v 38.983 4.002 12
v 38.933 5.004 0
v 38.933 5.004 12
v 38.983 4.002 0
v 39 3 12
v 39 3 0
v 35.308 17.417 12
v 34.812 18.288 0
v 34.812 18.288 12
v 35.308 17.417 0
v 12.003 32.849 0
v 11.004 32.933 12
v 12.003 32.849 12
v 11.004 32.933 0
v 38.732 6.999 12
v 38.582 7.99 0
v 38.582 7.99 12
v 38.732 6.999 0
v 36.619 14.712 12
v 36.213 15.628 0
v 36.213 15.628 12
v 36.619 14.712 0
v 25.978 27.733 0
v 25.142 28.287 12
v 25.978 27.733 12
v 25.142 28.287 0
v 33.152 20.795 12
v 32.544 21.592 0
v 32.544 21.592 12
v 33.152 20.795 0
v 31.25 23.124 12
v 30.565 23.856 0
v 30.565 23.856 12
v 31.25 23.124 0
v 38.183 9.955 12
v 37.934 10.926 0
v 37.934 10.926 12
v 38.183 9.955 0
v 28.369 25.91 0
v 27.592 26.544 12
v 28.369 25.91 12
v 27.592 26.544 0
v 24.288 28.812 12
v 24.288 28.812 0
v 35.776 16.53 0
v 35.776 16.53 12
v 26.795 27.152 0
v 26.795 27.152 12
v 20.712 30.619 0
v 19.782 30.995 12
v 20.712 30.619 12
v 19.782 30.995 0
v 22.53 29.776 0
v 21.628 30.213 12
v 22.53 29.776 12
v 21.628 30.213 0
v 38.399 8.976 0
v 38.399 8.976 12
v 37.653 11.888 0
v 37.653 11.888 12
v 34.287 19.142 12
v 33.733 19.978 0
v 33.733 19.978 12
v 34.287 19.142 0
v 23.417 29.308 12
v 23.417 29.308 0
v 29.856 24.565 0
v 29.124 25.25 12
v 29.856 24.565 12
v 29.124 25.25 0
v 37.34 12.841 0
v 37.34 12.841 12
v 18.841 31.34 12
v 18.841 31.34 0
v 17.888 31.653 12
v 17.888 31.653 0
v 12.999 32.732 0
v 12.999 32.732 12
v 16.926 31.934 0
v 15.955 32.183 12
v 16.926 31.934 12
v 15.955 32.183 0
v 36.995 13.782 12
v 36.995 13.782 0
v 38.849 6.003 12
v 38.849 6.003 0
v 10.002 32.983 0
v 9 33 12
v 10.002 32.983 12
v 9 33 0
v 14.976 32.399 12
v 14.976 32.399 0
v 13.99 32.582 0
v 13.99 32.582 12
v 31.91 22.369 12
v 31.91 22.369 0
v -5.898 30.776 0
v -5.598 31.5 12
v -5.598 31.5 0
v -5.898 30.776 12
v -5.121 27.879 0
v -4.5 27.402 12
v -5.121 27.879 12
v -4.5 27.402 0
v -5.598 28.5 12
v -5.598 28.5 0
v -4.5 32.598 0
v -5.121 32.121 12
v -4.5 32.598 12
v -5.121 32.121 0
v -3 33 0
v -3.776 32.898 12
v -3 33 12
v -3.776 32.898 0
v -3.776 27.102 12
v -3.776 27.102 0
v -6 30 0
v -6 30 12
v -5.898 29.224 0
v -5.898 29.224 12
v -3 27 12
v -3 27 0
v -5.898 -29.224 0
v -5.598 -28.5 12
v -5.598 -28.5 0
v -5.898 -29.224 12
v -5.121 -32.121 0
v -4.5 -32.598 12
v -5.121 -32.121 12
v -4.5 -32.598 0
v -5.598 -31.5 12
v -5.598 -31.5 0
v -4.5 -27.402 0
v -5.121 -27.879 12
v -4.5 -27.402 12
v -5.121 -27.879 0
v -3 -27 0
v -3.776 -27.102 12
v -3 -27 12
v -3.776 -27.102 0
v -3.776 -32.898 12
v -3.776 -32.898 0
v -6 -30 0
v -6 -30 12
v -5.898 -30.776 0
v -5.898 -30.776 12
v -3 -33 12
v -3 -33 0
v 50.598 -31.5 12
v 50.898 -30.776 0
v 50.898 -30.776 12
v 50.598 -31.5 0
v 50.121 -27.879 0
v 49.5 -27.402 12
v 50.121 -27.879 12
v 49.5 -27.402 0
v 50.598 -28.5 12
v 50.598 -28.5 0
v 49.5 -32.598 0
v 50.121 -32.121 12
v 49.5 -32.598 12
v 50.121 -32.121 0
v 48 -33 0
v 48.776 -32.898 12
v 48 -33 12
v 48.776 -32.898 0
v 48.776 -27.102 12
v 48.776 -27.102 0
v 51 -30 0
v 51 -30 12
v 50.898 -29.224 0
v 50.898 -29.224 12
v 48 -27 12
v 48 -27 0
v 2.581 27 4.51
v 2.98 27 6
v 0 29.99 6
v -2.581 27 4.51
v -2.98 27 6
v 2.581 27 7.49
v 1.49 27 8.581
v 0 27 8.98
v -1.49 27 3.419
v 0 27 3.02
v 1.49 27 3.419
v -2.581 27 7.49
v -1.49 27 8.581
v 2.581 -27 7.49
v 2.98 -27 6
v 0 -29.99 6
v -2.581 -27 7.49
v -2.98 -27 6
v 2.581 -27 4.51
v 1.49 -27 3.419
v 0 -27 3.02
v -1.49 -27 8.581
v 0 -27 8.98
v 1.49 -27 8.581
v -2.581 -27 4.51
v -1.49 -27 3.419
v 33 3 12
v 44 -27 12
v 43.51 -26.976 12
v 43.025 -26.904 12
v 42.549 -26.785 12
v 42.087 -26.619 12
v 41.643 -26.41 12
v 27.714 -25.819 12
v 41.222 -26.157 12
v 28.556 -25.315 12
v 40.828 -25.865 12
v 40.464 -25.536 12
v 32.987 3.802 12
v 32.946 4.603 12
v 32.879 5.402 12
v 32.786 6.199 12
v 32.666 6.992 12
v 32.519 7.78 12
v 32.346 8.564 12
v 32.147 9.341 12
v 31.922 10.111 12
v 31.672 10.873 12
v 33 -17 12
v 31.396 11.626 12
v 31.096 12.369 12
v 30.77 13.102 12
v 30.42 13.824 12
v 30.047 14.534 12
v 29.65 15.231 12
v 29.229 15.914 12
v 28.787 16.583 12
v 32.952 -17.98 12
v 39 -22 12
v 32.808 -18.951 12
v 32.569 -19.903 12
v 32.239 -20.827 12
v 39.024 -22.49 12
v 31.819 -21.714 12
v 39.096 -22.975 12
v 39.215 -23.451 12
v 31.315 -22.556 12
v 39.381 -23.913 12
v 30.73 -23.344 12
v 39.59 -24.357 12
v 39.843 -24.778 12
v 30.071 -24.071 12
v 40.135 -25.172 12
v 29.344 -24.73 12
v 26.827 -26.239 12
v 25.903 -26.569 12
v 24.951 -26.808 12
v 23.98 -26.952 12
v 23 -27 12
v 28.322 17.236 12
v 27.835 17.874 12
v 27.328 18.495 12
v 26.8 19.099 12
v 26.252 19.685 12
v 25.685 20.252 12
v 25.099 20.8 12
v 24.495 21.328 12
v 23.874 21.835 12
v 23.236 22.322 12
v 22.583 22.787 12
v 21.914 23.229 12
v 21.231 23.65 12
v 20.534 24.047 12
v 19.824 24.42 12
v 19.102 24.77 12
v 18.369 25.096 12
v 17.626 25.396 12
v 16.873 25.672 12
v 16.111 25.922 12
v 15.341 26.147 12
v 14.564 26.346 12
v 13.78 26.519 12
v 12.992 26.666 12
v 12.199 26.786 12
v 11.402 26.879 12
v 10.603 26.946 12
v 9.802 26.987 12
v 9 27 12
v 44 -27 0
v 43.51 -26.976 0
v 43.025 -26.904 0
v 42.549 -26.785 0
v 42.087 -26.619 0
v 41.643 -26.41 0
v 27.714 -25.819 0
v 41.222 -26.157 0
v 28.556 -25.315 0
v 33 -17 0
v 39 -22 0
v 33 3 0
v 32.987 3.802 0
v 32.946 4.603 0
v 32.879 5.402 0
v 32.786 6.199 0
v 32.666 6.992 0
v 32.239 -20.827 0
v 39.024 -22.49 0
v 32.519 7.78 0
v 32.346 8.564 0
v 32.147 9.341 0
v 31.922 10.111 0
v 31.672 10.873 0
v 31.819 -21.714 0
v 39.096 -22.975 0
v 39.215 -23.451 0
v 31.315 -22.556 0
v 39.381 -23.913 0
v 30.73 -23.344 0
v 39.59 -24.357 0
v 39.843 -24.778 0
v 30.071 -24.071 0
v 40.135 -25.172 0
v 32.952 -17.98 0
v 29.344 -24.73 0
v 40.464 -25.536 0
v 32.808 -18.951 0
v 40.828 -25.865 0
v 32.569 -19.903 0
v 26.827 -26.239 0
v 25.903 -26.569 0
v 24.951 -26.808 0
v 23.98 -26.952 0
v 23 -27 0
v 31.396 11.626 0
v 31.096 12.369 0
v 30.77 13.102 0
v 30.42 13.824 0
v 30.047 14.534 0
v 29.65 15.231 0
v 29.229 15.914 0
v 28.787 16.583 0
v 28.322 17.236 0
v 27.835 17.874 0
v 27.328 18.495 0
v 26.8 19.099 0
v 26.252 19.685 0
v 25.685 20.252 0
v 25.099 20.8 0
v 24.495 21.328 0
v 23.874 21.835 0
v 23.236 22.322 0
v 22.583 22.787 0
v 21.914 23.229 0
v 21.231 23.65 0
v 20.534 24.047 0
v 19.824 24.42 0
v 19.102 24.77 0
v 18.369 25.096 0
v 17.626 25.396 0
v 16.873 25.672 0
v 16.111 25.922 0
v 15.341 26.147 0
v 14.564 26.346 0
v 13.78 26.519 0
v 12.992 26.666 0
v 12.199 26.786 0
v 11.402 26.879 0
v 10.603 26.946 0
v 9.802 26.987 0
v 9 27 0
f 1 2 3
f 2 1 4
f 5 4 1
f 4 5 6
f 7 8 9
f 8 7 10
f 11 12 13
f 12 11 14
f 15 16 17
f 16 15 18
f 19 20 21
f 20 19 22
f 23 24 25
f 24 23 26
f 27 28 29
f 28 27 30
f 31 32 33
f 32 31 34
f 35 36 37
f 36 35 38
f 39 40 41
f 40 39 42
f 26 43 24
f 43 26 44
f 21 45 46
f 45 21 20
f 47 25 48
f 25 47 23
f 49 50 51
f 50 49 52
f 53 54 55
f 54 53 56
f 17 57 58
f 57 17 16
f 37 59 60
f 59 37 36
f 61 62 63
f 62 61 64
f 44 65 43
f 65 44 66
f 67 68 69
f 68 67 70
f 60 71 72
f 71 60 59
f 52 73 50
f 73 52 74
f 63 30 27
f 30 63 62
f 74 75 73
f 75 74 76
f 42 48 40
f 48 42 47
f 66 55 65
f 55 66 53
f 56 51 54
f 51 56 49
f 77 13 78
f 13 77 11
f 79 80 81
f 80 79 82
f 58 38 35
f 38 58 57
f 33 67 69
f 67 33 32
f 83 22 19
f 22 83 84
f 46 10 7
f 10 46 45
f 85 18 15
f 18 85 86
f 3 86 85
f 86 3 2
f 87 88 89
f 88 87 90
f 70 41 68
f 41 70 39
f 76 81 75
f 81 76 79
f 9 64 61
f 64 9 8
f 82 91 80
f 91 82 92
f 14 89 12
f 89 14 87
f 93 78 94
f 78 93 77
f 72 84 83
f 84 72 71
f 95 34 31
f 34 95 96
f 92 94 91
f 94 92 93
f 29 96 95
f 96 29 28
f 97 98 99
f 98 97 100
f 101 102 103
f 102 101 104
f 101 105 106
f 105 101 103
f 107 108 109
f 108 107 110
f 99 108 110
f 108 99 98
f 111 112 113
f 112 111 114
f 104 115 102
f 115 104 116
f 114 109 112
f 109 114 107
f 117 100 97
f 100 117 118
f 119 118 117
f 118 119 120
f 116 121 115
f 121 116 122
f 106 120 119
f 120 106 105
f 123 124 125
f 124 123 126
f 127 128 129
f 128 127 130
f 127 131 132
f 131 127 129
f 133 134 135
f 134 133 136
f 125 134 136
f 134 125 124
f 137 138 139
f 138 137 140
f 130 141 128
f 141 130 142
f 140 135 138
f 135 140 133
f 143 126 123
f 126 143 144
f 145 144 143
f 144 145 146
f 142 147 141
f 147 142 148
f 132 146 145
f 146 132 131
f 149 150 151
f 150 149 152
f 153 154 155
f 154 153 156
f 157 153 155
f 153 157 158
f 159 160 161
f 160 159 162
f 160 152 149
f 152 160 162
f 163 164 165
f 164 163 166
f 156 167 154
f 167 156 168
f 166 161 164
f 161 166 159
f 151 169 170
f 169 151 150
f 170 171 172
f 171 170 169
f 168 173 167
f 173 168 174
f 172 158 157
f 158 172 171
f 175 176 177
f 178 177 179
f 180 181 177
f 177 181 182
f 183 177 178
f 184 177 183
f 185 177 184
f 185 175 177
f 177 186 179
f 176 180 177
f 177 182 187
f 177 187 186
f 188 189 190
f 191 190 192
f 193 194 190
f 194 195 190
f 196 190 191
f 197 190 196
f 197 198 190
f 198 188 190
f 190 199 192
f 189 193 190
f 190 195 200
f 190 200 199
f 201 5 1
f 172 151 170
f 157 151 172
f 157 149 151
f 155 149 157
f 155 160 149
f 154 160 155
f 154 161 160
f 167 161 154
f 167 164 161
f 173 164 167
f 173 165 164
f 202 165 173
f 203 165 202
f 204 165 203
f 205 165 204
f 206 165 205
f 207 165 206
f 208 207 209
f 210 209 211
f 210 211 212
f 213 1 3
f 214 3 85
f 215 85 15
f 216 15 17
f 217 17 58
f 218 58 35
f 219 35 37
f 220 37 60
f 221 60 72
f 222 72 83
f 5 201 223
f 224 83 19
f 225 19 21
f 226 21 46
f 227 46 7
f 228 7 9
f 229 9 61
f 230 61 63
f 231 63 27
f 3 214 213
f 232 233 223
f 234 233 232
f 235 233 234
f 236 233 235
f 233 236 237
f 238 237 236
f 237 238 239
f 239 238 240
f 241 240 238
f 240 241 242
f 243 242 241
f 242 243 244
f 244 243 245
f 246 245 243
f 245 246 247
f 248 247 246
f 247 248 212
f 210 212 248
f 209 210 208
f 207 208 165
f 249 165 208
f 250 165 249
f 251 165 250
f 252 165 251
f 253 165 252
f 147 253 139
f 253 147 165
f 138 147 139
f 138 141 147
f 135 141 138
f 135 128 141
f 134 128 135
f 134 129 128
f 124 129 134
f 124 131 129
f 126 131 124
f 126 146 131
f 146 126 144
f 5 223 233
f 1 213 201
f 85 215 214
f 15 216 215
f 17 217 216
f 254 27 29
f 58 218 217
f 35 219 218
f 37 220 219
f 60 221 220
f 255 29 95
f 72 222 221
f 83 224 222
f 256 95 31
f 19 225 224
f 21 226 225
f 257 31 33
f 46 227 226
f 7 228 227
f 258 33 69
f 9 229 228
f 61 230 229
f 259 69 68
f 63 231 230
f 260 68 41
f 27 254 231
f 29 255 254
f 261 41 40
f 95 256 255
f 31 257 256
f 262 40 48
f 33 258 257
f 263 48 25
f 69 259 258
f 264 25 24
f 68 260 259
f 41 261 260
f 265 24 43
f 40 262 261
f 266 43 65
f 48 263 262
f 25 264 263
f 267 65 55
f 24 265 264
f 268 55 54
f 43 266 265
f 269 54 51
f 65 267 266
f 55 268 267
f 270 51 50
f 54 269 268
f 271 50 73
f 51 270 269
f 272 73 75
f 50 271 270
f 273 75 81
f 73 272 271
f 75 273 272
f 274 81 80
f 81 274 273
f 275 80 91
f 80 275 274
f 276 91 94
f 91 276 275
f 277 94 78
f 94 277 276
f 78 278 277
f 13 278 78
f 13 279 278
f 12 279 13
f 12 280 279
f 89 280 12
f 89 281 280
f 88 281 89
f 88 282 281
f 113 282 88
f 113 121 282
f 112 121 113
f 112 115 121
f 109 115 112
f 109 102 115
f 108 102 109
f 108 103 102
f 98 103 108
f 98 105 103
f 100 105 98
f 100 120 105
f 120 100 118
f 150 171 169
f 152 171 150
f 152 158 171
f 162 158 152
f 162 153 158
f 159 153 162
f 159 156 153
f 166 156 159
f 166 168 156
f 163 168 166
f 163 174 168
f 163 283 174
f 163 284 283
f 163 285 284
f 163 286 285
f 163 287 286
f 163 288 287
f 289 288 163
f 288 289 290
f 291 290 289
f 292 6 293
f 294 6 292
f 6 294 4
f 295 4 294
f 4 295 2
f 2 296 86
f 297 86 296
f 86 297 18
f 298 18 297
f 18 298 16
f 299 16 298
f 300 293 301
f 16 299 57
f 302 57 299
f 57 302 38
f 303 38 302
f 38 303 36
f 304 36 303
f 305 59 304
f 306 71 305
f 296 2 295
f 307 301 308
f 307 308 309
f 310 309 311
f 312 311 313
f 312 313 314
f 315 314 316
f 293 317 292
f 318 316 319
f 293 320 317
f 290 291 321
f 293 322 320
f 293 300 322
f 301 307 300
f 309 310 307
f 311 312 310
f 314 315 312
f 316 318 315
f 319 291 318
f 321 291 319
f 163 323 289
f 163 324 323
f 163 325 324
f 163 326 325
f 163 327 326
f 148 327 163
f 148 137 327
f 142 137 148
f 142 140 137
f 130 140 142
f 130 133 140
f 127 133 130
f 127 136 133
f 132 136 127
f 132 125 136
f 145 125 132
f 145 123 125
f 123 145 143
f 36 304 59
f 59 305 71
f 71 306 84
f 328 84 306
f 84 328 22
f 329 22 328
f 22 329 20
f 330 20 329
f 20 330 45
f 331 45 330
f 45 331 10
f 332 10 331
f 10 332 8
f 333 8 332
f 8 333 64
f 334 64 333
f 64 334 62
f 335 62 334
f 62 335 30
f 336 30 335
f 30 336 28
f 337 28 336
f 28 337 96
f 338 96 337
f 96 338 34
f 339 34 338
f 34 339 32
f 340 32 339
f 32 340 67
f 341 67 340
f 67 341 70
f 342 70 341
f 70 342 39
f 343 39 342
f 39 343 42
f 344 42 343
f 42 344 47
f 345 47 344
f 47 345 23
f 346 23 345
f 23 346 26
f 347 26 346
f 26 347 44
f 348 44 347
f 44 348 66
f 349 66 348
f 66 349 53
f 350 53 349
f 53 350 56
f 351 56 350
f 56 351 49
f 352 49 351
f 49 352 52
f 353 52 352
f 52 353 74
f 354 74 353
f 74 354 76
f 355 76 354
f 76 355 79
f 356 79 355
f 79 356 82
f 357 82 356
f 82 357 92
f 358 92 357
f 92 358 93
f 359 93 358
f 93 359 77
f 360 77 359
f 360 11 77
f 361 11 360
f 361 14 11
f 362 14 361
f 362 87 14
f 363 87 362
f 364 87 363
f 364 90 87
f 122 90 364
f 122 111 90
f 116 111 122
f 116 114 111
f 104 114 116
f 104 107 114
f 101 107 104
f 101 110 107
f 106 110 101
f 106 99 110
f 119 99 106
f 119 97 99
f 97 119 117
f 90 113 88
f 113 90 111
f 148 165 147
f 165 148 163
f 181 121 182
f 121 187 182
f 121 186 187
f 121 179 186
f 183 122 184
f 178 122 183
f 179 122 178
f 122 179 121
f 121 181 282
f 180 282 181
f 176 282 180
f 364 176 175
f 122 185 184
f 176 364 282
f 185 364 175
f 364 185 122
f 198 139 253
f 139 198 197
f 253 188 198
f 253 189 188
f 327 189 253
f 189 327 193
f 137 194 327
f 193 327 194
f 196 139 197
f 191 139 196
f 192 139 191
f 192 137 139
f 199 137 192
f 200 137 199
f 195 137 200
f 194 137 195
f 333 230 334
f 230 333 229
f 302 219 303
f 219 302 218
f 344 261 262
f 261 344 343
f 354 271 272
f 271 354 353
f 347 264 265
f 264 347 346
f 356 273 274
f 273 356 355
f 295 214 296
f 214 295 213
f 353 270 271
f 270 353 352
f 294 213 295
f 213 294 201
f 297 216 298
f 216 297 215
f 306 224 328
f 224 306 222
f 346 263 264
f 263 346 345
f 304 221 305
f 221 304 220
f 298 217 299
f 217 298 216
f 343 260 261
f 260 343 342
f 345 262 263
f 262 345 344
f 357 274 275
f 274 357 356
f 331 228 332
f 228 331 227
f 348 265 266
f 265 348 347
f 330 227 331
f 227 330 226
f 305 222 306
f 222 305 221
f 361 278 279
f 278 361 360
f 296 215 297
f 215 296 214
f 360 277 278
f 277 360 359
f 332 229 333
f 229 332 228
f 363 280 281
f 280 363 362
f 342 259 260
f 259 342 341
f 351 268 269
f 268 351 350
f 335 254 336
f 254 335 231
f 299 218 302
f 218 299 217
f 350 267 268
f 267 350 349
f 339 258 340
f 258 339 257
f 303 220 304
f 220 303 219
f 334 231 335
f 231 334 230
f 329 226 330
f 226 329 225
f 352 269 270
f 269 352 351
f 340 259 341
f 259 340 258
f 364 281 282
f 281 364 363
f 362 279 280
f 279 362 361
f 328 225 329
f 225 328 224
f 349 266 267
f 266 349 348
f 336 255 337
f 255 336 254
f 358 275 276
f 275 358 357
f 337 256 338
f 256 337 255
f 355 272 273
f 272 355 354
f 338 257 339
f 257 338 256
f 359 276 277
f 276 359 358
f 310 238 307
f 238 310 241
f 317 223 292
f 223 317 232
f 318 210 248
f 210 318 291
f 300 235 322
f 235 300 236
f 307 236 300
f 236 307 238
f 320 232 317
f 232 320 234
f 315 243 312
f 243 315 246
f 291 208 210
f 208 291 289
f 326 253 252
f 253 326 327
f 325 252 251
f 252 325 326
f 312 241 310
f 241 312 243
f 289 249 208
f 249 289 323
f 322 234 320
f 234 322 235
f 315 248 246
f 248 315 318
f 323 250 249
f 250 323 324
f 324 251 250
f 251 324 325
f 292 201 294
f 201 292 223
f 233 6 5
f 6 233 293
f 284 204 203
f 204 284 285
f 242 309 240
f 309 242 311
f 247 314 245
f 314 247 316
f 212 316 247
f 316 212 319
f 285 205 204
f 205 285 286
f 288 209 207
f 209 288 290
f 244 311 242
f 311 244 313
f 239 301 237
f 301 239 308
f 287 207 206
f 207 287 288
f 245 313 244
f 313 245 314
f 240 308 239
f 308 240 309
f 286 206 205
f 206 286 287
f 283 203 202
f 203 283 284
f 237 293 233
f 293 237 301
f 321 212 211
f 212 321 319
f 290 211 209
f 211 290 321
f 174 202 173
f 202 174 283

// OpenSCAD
//Customizable Gimbal Mount to put a Spinning Shape in
//7/21/2015     By: David Bunch
//
//Initially made to spin this shape: http://www.thingiverse.com/thing:543083
//
//CUSTOMIZER VARIABLES

//1. Length Between Gimbal Points
GimbalDistance = 60;

//2. Inside Width Clearance Distance
PivotThroat = 33;

//3. Diameter of Pivot Point
PivotDia = 6;

//4. Thickness of Part
Thickness = 6;

//5. Height of Part
Ht = 12;

//6. Resolution of Pivot Points
iresPiv = 12;

//7. Resolution of Larger Curves
iresBig = 188;

//8. Resolution of Smaller Curves
iresSmall = 64;

//9. Resolution of Round Corners
iresRnd = 24;

//CUSTOMIZER VARIABLES END

PivRad = PivotDia / 2;
Thk2 = Thickness / 2;
G2 = GimbalDistance / 2;
Piv_Y = G2 - Thk2 - .01;
//Initial Cube to cut from
Len = GimbalDistance + Thickness;
Wid = PivRad + PivotThroat + Thickness + 9 + Thickness;
Cube_Y = G2 + Thk2;
Cube_X =  PivRad + Thk2;
//Cube portion at Gimbal Throat full length
Cut1Len = Len - (Thickness * 2);
Cut1Wid = (PivotThroat - 24) + PivRad + Thickness;
Cut1_X = PivRad + Thickness;
Cut1_Y = G2 - Thk2;
//Cut largest Cylinder inside cut at top Right
CutCyl1_X = PivotThroat - 24;
CutCyl1_Y = G2 - Thk2 - 24;
//Cut Smallest Cylinder inside cut at bottom right
CutCyl2_X = PivotThroat - 10;
CutCyl2_Y = Cut1_Y - 10;
//Inside Bottom Cube Cut from Center of pivot to edge of bottom cylinder cut
Cube2Len=11;
Cube2Wid=PivotThroat;
Cut2_X = -10;
//Inside Bottom Cube Cut 
Cube3Len = CutCyl1_Y + CutCyl2_Y;
Cube3Wid = PivotThroat;
Cut3_X = 0;
Cut3_Y = CutCyl2_Y;
//Outside Top Cube
Cube4Wid = 9 + Thickness;
Cube4Len = Len;
Cut4_X = PivotThroat + Thickness;
//Outisde Bottom Cylinder Cut
CutCyl3_X = PivotThroat + Thickness + 5;
CutCyl3_Y = G2 - Thk2 - 5;
//Outside Bottom cut of Cylinder
Cube5Wid = 20;
Cube5Len = 20;
Cut5_X = PivotThroat + Thickness+5;
Cut5_Y = G2 - Thk2;
//Outside Top cut of Cylinder
Cube6Wid = 10;
Cube6Len = 20;
Cut6_X = PivotThroat + Thickness;
Cut6_Y = G2 - Thk2 - 5;
//Outside Top Cube for Cutting
Cube7Wid = 24 + Thickness + 5;
Cube7Len = 24 + Thickness + 5;
//Round Corners variables
RndCornLen = Thickness * 2;
RndCornWid = Thickness * 2;
RndCorn_X = RndCornLen;
RndCorn_Y = RndCornWid / 2;
XLoc1 = PivRad;
YLoc1 = Cube_Y - Thk2;
XLoc2 = PivotThroat + Thickness + 9;
module CutOutTopCyl()
{
    difference()
    {
        translate([CutCyl1_X,CutCyl1_Y,-1])
        cube([Cube7Wid,Cube7Len,Ht+2]);
        translate([CutCyl1_X,CutCyl1_Y,-2])
        cylinder(d=48 + (Thickness * 2),h=Ht+4,$fn=iresBig);
    }
}
module RoundCorners()
{
    difference()
    {
        translate([-RndCorn_X,-RndCorn_Y,-1])
        cube([RndCornWid,RndCornLen,Ht+2]);
        translate([0,0,-2])
        cylinder(d=Thickness,h=Ht+4,$fn=iresRnd);
    }
}
module Indent()
{
    translate([0,0,-.01])
    cylinder(d1=PivotDia,d2=0,h=(PivotDia / 2) + .01,$fn=iresPiv);
    translate([0,0,-2])
    cylinder(d=PivotDia,h=2,$fn=iresPiv);
}
module Gimbal()
{
    difference()
    {
//Initial Cube to cut from
        translate([-Cube_X,-Cube_Y,0])
        cube([Wid,Len,Ht]);
//Cube portion at Gimbal Throat full length
        translate([-Cut1_X,-Cut1_Y,-1])
        cube([Cut1Wid,Cut1Len,Ht+2]);
//Cut largest Cylinder inside cut at top Right
        translate([CutCyl1_X,CutCyl1_Y,-1])
        cylinder(d=48,h=Ht+2,$fn=iresBig);
//Cut Smallest Cylinder inside cut at bottom right
        translate([CutCyl2_X,-CutCyl2_Y,-1])
        cylinder(d=20,h=Ht+2,$fn=iresSmall);
//Inside Bottom Cube Cut from Center of pivot to edge of bottom cylinder cut
        translate([Cut2_X,-Cut1_Y,-1])
        cube([Cube2Wid,Cube2Len,Ht+2]);
//Inside Bottom Cube Cut 
        translate([Cut3_X,-Cut3_Y,-1])
        cube([Cube3Wid,Cube3Len,Ht+2]);
//Outside Top Cube Cut 
        translate([Cut4_X,-Cut3_Y,-1])
        cube([Cube4Wid,Cube4Len,Ht+2]);
//Outside Bottom Cylinder Cut 
        translate([CutCyl3_X,-CutCyl3_Y,-1])
        cylinder(d=10,h=Ht+2,$fn=iresSmall);
//Outside Bottom Cube Cut 
        translate([Cut5_X,-Cut5_Y,-1])
        cube([Cube5Wid,Cube5Len,Ht+2]);
//Outside Bottom Cube Cut 
        translate([Cut6_X,-Cut6_Y,-1])
        cube([Cube6Wid,Cube6Len,Ht+2]);
//Cut the Outside Top Curve
        CutOutTopCyl();
//Round the 3 end Points of Gimbal
        translate([-XLoc1,YLoc1,0])
        RoundCorners();
        translate([-XLoc1,-YLoc1,0])
        RoundCorners();
        translate([XLoc2,-YLoc1,0])
        rotate([0,0,180])
        RoundCorners();
//Cut out the Gimbal pivot points
        translate([0,Piv_Y,Ht/2])
        rotate([-90,0,0])
        Indent();
        translate([0,-Piv_Y,Ht/2])
        rotate([90,0,0])
        Indent();
    }
}
//Draw the Final Part
Gimbal();
